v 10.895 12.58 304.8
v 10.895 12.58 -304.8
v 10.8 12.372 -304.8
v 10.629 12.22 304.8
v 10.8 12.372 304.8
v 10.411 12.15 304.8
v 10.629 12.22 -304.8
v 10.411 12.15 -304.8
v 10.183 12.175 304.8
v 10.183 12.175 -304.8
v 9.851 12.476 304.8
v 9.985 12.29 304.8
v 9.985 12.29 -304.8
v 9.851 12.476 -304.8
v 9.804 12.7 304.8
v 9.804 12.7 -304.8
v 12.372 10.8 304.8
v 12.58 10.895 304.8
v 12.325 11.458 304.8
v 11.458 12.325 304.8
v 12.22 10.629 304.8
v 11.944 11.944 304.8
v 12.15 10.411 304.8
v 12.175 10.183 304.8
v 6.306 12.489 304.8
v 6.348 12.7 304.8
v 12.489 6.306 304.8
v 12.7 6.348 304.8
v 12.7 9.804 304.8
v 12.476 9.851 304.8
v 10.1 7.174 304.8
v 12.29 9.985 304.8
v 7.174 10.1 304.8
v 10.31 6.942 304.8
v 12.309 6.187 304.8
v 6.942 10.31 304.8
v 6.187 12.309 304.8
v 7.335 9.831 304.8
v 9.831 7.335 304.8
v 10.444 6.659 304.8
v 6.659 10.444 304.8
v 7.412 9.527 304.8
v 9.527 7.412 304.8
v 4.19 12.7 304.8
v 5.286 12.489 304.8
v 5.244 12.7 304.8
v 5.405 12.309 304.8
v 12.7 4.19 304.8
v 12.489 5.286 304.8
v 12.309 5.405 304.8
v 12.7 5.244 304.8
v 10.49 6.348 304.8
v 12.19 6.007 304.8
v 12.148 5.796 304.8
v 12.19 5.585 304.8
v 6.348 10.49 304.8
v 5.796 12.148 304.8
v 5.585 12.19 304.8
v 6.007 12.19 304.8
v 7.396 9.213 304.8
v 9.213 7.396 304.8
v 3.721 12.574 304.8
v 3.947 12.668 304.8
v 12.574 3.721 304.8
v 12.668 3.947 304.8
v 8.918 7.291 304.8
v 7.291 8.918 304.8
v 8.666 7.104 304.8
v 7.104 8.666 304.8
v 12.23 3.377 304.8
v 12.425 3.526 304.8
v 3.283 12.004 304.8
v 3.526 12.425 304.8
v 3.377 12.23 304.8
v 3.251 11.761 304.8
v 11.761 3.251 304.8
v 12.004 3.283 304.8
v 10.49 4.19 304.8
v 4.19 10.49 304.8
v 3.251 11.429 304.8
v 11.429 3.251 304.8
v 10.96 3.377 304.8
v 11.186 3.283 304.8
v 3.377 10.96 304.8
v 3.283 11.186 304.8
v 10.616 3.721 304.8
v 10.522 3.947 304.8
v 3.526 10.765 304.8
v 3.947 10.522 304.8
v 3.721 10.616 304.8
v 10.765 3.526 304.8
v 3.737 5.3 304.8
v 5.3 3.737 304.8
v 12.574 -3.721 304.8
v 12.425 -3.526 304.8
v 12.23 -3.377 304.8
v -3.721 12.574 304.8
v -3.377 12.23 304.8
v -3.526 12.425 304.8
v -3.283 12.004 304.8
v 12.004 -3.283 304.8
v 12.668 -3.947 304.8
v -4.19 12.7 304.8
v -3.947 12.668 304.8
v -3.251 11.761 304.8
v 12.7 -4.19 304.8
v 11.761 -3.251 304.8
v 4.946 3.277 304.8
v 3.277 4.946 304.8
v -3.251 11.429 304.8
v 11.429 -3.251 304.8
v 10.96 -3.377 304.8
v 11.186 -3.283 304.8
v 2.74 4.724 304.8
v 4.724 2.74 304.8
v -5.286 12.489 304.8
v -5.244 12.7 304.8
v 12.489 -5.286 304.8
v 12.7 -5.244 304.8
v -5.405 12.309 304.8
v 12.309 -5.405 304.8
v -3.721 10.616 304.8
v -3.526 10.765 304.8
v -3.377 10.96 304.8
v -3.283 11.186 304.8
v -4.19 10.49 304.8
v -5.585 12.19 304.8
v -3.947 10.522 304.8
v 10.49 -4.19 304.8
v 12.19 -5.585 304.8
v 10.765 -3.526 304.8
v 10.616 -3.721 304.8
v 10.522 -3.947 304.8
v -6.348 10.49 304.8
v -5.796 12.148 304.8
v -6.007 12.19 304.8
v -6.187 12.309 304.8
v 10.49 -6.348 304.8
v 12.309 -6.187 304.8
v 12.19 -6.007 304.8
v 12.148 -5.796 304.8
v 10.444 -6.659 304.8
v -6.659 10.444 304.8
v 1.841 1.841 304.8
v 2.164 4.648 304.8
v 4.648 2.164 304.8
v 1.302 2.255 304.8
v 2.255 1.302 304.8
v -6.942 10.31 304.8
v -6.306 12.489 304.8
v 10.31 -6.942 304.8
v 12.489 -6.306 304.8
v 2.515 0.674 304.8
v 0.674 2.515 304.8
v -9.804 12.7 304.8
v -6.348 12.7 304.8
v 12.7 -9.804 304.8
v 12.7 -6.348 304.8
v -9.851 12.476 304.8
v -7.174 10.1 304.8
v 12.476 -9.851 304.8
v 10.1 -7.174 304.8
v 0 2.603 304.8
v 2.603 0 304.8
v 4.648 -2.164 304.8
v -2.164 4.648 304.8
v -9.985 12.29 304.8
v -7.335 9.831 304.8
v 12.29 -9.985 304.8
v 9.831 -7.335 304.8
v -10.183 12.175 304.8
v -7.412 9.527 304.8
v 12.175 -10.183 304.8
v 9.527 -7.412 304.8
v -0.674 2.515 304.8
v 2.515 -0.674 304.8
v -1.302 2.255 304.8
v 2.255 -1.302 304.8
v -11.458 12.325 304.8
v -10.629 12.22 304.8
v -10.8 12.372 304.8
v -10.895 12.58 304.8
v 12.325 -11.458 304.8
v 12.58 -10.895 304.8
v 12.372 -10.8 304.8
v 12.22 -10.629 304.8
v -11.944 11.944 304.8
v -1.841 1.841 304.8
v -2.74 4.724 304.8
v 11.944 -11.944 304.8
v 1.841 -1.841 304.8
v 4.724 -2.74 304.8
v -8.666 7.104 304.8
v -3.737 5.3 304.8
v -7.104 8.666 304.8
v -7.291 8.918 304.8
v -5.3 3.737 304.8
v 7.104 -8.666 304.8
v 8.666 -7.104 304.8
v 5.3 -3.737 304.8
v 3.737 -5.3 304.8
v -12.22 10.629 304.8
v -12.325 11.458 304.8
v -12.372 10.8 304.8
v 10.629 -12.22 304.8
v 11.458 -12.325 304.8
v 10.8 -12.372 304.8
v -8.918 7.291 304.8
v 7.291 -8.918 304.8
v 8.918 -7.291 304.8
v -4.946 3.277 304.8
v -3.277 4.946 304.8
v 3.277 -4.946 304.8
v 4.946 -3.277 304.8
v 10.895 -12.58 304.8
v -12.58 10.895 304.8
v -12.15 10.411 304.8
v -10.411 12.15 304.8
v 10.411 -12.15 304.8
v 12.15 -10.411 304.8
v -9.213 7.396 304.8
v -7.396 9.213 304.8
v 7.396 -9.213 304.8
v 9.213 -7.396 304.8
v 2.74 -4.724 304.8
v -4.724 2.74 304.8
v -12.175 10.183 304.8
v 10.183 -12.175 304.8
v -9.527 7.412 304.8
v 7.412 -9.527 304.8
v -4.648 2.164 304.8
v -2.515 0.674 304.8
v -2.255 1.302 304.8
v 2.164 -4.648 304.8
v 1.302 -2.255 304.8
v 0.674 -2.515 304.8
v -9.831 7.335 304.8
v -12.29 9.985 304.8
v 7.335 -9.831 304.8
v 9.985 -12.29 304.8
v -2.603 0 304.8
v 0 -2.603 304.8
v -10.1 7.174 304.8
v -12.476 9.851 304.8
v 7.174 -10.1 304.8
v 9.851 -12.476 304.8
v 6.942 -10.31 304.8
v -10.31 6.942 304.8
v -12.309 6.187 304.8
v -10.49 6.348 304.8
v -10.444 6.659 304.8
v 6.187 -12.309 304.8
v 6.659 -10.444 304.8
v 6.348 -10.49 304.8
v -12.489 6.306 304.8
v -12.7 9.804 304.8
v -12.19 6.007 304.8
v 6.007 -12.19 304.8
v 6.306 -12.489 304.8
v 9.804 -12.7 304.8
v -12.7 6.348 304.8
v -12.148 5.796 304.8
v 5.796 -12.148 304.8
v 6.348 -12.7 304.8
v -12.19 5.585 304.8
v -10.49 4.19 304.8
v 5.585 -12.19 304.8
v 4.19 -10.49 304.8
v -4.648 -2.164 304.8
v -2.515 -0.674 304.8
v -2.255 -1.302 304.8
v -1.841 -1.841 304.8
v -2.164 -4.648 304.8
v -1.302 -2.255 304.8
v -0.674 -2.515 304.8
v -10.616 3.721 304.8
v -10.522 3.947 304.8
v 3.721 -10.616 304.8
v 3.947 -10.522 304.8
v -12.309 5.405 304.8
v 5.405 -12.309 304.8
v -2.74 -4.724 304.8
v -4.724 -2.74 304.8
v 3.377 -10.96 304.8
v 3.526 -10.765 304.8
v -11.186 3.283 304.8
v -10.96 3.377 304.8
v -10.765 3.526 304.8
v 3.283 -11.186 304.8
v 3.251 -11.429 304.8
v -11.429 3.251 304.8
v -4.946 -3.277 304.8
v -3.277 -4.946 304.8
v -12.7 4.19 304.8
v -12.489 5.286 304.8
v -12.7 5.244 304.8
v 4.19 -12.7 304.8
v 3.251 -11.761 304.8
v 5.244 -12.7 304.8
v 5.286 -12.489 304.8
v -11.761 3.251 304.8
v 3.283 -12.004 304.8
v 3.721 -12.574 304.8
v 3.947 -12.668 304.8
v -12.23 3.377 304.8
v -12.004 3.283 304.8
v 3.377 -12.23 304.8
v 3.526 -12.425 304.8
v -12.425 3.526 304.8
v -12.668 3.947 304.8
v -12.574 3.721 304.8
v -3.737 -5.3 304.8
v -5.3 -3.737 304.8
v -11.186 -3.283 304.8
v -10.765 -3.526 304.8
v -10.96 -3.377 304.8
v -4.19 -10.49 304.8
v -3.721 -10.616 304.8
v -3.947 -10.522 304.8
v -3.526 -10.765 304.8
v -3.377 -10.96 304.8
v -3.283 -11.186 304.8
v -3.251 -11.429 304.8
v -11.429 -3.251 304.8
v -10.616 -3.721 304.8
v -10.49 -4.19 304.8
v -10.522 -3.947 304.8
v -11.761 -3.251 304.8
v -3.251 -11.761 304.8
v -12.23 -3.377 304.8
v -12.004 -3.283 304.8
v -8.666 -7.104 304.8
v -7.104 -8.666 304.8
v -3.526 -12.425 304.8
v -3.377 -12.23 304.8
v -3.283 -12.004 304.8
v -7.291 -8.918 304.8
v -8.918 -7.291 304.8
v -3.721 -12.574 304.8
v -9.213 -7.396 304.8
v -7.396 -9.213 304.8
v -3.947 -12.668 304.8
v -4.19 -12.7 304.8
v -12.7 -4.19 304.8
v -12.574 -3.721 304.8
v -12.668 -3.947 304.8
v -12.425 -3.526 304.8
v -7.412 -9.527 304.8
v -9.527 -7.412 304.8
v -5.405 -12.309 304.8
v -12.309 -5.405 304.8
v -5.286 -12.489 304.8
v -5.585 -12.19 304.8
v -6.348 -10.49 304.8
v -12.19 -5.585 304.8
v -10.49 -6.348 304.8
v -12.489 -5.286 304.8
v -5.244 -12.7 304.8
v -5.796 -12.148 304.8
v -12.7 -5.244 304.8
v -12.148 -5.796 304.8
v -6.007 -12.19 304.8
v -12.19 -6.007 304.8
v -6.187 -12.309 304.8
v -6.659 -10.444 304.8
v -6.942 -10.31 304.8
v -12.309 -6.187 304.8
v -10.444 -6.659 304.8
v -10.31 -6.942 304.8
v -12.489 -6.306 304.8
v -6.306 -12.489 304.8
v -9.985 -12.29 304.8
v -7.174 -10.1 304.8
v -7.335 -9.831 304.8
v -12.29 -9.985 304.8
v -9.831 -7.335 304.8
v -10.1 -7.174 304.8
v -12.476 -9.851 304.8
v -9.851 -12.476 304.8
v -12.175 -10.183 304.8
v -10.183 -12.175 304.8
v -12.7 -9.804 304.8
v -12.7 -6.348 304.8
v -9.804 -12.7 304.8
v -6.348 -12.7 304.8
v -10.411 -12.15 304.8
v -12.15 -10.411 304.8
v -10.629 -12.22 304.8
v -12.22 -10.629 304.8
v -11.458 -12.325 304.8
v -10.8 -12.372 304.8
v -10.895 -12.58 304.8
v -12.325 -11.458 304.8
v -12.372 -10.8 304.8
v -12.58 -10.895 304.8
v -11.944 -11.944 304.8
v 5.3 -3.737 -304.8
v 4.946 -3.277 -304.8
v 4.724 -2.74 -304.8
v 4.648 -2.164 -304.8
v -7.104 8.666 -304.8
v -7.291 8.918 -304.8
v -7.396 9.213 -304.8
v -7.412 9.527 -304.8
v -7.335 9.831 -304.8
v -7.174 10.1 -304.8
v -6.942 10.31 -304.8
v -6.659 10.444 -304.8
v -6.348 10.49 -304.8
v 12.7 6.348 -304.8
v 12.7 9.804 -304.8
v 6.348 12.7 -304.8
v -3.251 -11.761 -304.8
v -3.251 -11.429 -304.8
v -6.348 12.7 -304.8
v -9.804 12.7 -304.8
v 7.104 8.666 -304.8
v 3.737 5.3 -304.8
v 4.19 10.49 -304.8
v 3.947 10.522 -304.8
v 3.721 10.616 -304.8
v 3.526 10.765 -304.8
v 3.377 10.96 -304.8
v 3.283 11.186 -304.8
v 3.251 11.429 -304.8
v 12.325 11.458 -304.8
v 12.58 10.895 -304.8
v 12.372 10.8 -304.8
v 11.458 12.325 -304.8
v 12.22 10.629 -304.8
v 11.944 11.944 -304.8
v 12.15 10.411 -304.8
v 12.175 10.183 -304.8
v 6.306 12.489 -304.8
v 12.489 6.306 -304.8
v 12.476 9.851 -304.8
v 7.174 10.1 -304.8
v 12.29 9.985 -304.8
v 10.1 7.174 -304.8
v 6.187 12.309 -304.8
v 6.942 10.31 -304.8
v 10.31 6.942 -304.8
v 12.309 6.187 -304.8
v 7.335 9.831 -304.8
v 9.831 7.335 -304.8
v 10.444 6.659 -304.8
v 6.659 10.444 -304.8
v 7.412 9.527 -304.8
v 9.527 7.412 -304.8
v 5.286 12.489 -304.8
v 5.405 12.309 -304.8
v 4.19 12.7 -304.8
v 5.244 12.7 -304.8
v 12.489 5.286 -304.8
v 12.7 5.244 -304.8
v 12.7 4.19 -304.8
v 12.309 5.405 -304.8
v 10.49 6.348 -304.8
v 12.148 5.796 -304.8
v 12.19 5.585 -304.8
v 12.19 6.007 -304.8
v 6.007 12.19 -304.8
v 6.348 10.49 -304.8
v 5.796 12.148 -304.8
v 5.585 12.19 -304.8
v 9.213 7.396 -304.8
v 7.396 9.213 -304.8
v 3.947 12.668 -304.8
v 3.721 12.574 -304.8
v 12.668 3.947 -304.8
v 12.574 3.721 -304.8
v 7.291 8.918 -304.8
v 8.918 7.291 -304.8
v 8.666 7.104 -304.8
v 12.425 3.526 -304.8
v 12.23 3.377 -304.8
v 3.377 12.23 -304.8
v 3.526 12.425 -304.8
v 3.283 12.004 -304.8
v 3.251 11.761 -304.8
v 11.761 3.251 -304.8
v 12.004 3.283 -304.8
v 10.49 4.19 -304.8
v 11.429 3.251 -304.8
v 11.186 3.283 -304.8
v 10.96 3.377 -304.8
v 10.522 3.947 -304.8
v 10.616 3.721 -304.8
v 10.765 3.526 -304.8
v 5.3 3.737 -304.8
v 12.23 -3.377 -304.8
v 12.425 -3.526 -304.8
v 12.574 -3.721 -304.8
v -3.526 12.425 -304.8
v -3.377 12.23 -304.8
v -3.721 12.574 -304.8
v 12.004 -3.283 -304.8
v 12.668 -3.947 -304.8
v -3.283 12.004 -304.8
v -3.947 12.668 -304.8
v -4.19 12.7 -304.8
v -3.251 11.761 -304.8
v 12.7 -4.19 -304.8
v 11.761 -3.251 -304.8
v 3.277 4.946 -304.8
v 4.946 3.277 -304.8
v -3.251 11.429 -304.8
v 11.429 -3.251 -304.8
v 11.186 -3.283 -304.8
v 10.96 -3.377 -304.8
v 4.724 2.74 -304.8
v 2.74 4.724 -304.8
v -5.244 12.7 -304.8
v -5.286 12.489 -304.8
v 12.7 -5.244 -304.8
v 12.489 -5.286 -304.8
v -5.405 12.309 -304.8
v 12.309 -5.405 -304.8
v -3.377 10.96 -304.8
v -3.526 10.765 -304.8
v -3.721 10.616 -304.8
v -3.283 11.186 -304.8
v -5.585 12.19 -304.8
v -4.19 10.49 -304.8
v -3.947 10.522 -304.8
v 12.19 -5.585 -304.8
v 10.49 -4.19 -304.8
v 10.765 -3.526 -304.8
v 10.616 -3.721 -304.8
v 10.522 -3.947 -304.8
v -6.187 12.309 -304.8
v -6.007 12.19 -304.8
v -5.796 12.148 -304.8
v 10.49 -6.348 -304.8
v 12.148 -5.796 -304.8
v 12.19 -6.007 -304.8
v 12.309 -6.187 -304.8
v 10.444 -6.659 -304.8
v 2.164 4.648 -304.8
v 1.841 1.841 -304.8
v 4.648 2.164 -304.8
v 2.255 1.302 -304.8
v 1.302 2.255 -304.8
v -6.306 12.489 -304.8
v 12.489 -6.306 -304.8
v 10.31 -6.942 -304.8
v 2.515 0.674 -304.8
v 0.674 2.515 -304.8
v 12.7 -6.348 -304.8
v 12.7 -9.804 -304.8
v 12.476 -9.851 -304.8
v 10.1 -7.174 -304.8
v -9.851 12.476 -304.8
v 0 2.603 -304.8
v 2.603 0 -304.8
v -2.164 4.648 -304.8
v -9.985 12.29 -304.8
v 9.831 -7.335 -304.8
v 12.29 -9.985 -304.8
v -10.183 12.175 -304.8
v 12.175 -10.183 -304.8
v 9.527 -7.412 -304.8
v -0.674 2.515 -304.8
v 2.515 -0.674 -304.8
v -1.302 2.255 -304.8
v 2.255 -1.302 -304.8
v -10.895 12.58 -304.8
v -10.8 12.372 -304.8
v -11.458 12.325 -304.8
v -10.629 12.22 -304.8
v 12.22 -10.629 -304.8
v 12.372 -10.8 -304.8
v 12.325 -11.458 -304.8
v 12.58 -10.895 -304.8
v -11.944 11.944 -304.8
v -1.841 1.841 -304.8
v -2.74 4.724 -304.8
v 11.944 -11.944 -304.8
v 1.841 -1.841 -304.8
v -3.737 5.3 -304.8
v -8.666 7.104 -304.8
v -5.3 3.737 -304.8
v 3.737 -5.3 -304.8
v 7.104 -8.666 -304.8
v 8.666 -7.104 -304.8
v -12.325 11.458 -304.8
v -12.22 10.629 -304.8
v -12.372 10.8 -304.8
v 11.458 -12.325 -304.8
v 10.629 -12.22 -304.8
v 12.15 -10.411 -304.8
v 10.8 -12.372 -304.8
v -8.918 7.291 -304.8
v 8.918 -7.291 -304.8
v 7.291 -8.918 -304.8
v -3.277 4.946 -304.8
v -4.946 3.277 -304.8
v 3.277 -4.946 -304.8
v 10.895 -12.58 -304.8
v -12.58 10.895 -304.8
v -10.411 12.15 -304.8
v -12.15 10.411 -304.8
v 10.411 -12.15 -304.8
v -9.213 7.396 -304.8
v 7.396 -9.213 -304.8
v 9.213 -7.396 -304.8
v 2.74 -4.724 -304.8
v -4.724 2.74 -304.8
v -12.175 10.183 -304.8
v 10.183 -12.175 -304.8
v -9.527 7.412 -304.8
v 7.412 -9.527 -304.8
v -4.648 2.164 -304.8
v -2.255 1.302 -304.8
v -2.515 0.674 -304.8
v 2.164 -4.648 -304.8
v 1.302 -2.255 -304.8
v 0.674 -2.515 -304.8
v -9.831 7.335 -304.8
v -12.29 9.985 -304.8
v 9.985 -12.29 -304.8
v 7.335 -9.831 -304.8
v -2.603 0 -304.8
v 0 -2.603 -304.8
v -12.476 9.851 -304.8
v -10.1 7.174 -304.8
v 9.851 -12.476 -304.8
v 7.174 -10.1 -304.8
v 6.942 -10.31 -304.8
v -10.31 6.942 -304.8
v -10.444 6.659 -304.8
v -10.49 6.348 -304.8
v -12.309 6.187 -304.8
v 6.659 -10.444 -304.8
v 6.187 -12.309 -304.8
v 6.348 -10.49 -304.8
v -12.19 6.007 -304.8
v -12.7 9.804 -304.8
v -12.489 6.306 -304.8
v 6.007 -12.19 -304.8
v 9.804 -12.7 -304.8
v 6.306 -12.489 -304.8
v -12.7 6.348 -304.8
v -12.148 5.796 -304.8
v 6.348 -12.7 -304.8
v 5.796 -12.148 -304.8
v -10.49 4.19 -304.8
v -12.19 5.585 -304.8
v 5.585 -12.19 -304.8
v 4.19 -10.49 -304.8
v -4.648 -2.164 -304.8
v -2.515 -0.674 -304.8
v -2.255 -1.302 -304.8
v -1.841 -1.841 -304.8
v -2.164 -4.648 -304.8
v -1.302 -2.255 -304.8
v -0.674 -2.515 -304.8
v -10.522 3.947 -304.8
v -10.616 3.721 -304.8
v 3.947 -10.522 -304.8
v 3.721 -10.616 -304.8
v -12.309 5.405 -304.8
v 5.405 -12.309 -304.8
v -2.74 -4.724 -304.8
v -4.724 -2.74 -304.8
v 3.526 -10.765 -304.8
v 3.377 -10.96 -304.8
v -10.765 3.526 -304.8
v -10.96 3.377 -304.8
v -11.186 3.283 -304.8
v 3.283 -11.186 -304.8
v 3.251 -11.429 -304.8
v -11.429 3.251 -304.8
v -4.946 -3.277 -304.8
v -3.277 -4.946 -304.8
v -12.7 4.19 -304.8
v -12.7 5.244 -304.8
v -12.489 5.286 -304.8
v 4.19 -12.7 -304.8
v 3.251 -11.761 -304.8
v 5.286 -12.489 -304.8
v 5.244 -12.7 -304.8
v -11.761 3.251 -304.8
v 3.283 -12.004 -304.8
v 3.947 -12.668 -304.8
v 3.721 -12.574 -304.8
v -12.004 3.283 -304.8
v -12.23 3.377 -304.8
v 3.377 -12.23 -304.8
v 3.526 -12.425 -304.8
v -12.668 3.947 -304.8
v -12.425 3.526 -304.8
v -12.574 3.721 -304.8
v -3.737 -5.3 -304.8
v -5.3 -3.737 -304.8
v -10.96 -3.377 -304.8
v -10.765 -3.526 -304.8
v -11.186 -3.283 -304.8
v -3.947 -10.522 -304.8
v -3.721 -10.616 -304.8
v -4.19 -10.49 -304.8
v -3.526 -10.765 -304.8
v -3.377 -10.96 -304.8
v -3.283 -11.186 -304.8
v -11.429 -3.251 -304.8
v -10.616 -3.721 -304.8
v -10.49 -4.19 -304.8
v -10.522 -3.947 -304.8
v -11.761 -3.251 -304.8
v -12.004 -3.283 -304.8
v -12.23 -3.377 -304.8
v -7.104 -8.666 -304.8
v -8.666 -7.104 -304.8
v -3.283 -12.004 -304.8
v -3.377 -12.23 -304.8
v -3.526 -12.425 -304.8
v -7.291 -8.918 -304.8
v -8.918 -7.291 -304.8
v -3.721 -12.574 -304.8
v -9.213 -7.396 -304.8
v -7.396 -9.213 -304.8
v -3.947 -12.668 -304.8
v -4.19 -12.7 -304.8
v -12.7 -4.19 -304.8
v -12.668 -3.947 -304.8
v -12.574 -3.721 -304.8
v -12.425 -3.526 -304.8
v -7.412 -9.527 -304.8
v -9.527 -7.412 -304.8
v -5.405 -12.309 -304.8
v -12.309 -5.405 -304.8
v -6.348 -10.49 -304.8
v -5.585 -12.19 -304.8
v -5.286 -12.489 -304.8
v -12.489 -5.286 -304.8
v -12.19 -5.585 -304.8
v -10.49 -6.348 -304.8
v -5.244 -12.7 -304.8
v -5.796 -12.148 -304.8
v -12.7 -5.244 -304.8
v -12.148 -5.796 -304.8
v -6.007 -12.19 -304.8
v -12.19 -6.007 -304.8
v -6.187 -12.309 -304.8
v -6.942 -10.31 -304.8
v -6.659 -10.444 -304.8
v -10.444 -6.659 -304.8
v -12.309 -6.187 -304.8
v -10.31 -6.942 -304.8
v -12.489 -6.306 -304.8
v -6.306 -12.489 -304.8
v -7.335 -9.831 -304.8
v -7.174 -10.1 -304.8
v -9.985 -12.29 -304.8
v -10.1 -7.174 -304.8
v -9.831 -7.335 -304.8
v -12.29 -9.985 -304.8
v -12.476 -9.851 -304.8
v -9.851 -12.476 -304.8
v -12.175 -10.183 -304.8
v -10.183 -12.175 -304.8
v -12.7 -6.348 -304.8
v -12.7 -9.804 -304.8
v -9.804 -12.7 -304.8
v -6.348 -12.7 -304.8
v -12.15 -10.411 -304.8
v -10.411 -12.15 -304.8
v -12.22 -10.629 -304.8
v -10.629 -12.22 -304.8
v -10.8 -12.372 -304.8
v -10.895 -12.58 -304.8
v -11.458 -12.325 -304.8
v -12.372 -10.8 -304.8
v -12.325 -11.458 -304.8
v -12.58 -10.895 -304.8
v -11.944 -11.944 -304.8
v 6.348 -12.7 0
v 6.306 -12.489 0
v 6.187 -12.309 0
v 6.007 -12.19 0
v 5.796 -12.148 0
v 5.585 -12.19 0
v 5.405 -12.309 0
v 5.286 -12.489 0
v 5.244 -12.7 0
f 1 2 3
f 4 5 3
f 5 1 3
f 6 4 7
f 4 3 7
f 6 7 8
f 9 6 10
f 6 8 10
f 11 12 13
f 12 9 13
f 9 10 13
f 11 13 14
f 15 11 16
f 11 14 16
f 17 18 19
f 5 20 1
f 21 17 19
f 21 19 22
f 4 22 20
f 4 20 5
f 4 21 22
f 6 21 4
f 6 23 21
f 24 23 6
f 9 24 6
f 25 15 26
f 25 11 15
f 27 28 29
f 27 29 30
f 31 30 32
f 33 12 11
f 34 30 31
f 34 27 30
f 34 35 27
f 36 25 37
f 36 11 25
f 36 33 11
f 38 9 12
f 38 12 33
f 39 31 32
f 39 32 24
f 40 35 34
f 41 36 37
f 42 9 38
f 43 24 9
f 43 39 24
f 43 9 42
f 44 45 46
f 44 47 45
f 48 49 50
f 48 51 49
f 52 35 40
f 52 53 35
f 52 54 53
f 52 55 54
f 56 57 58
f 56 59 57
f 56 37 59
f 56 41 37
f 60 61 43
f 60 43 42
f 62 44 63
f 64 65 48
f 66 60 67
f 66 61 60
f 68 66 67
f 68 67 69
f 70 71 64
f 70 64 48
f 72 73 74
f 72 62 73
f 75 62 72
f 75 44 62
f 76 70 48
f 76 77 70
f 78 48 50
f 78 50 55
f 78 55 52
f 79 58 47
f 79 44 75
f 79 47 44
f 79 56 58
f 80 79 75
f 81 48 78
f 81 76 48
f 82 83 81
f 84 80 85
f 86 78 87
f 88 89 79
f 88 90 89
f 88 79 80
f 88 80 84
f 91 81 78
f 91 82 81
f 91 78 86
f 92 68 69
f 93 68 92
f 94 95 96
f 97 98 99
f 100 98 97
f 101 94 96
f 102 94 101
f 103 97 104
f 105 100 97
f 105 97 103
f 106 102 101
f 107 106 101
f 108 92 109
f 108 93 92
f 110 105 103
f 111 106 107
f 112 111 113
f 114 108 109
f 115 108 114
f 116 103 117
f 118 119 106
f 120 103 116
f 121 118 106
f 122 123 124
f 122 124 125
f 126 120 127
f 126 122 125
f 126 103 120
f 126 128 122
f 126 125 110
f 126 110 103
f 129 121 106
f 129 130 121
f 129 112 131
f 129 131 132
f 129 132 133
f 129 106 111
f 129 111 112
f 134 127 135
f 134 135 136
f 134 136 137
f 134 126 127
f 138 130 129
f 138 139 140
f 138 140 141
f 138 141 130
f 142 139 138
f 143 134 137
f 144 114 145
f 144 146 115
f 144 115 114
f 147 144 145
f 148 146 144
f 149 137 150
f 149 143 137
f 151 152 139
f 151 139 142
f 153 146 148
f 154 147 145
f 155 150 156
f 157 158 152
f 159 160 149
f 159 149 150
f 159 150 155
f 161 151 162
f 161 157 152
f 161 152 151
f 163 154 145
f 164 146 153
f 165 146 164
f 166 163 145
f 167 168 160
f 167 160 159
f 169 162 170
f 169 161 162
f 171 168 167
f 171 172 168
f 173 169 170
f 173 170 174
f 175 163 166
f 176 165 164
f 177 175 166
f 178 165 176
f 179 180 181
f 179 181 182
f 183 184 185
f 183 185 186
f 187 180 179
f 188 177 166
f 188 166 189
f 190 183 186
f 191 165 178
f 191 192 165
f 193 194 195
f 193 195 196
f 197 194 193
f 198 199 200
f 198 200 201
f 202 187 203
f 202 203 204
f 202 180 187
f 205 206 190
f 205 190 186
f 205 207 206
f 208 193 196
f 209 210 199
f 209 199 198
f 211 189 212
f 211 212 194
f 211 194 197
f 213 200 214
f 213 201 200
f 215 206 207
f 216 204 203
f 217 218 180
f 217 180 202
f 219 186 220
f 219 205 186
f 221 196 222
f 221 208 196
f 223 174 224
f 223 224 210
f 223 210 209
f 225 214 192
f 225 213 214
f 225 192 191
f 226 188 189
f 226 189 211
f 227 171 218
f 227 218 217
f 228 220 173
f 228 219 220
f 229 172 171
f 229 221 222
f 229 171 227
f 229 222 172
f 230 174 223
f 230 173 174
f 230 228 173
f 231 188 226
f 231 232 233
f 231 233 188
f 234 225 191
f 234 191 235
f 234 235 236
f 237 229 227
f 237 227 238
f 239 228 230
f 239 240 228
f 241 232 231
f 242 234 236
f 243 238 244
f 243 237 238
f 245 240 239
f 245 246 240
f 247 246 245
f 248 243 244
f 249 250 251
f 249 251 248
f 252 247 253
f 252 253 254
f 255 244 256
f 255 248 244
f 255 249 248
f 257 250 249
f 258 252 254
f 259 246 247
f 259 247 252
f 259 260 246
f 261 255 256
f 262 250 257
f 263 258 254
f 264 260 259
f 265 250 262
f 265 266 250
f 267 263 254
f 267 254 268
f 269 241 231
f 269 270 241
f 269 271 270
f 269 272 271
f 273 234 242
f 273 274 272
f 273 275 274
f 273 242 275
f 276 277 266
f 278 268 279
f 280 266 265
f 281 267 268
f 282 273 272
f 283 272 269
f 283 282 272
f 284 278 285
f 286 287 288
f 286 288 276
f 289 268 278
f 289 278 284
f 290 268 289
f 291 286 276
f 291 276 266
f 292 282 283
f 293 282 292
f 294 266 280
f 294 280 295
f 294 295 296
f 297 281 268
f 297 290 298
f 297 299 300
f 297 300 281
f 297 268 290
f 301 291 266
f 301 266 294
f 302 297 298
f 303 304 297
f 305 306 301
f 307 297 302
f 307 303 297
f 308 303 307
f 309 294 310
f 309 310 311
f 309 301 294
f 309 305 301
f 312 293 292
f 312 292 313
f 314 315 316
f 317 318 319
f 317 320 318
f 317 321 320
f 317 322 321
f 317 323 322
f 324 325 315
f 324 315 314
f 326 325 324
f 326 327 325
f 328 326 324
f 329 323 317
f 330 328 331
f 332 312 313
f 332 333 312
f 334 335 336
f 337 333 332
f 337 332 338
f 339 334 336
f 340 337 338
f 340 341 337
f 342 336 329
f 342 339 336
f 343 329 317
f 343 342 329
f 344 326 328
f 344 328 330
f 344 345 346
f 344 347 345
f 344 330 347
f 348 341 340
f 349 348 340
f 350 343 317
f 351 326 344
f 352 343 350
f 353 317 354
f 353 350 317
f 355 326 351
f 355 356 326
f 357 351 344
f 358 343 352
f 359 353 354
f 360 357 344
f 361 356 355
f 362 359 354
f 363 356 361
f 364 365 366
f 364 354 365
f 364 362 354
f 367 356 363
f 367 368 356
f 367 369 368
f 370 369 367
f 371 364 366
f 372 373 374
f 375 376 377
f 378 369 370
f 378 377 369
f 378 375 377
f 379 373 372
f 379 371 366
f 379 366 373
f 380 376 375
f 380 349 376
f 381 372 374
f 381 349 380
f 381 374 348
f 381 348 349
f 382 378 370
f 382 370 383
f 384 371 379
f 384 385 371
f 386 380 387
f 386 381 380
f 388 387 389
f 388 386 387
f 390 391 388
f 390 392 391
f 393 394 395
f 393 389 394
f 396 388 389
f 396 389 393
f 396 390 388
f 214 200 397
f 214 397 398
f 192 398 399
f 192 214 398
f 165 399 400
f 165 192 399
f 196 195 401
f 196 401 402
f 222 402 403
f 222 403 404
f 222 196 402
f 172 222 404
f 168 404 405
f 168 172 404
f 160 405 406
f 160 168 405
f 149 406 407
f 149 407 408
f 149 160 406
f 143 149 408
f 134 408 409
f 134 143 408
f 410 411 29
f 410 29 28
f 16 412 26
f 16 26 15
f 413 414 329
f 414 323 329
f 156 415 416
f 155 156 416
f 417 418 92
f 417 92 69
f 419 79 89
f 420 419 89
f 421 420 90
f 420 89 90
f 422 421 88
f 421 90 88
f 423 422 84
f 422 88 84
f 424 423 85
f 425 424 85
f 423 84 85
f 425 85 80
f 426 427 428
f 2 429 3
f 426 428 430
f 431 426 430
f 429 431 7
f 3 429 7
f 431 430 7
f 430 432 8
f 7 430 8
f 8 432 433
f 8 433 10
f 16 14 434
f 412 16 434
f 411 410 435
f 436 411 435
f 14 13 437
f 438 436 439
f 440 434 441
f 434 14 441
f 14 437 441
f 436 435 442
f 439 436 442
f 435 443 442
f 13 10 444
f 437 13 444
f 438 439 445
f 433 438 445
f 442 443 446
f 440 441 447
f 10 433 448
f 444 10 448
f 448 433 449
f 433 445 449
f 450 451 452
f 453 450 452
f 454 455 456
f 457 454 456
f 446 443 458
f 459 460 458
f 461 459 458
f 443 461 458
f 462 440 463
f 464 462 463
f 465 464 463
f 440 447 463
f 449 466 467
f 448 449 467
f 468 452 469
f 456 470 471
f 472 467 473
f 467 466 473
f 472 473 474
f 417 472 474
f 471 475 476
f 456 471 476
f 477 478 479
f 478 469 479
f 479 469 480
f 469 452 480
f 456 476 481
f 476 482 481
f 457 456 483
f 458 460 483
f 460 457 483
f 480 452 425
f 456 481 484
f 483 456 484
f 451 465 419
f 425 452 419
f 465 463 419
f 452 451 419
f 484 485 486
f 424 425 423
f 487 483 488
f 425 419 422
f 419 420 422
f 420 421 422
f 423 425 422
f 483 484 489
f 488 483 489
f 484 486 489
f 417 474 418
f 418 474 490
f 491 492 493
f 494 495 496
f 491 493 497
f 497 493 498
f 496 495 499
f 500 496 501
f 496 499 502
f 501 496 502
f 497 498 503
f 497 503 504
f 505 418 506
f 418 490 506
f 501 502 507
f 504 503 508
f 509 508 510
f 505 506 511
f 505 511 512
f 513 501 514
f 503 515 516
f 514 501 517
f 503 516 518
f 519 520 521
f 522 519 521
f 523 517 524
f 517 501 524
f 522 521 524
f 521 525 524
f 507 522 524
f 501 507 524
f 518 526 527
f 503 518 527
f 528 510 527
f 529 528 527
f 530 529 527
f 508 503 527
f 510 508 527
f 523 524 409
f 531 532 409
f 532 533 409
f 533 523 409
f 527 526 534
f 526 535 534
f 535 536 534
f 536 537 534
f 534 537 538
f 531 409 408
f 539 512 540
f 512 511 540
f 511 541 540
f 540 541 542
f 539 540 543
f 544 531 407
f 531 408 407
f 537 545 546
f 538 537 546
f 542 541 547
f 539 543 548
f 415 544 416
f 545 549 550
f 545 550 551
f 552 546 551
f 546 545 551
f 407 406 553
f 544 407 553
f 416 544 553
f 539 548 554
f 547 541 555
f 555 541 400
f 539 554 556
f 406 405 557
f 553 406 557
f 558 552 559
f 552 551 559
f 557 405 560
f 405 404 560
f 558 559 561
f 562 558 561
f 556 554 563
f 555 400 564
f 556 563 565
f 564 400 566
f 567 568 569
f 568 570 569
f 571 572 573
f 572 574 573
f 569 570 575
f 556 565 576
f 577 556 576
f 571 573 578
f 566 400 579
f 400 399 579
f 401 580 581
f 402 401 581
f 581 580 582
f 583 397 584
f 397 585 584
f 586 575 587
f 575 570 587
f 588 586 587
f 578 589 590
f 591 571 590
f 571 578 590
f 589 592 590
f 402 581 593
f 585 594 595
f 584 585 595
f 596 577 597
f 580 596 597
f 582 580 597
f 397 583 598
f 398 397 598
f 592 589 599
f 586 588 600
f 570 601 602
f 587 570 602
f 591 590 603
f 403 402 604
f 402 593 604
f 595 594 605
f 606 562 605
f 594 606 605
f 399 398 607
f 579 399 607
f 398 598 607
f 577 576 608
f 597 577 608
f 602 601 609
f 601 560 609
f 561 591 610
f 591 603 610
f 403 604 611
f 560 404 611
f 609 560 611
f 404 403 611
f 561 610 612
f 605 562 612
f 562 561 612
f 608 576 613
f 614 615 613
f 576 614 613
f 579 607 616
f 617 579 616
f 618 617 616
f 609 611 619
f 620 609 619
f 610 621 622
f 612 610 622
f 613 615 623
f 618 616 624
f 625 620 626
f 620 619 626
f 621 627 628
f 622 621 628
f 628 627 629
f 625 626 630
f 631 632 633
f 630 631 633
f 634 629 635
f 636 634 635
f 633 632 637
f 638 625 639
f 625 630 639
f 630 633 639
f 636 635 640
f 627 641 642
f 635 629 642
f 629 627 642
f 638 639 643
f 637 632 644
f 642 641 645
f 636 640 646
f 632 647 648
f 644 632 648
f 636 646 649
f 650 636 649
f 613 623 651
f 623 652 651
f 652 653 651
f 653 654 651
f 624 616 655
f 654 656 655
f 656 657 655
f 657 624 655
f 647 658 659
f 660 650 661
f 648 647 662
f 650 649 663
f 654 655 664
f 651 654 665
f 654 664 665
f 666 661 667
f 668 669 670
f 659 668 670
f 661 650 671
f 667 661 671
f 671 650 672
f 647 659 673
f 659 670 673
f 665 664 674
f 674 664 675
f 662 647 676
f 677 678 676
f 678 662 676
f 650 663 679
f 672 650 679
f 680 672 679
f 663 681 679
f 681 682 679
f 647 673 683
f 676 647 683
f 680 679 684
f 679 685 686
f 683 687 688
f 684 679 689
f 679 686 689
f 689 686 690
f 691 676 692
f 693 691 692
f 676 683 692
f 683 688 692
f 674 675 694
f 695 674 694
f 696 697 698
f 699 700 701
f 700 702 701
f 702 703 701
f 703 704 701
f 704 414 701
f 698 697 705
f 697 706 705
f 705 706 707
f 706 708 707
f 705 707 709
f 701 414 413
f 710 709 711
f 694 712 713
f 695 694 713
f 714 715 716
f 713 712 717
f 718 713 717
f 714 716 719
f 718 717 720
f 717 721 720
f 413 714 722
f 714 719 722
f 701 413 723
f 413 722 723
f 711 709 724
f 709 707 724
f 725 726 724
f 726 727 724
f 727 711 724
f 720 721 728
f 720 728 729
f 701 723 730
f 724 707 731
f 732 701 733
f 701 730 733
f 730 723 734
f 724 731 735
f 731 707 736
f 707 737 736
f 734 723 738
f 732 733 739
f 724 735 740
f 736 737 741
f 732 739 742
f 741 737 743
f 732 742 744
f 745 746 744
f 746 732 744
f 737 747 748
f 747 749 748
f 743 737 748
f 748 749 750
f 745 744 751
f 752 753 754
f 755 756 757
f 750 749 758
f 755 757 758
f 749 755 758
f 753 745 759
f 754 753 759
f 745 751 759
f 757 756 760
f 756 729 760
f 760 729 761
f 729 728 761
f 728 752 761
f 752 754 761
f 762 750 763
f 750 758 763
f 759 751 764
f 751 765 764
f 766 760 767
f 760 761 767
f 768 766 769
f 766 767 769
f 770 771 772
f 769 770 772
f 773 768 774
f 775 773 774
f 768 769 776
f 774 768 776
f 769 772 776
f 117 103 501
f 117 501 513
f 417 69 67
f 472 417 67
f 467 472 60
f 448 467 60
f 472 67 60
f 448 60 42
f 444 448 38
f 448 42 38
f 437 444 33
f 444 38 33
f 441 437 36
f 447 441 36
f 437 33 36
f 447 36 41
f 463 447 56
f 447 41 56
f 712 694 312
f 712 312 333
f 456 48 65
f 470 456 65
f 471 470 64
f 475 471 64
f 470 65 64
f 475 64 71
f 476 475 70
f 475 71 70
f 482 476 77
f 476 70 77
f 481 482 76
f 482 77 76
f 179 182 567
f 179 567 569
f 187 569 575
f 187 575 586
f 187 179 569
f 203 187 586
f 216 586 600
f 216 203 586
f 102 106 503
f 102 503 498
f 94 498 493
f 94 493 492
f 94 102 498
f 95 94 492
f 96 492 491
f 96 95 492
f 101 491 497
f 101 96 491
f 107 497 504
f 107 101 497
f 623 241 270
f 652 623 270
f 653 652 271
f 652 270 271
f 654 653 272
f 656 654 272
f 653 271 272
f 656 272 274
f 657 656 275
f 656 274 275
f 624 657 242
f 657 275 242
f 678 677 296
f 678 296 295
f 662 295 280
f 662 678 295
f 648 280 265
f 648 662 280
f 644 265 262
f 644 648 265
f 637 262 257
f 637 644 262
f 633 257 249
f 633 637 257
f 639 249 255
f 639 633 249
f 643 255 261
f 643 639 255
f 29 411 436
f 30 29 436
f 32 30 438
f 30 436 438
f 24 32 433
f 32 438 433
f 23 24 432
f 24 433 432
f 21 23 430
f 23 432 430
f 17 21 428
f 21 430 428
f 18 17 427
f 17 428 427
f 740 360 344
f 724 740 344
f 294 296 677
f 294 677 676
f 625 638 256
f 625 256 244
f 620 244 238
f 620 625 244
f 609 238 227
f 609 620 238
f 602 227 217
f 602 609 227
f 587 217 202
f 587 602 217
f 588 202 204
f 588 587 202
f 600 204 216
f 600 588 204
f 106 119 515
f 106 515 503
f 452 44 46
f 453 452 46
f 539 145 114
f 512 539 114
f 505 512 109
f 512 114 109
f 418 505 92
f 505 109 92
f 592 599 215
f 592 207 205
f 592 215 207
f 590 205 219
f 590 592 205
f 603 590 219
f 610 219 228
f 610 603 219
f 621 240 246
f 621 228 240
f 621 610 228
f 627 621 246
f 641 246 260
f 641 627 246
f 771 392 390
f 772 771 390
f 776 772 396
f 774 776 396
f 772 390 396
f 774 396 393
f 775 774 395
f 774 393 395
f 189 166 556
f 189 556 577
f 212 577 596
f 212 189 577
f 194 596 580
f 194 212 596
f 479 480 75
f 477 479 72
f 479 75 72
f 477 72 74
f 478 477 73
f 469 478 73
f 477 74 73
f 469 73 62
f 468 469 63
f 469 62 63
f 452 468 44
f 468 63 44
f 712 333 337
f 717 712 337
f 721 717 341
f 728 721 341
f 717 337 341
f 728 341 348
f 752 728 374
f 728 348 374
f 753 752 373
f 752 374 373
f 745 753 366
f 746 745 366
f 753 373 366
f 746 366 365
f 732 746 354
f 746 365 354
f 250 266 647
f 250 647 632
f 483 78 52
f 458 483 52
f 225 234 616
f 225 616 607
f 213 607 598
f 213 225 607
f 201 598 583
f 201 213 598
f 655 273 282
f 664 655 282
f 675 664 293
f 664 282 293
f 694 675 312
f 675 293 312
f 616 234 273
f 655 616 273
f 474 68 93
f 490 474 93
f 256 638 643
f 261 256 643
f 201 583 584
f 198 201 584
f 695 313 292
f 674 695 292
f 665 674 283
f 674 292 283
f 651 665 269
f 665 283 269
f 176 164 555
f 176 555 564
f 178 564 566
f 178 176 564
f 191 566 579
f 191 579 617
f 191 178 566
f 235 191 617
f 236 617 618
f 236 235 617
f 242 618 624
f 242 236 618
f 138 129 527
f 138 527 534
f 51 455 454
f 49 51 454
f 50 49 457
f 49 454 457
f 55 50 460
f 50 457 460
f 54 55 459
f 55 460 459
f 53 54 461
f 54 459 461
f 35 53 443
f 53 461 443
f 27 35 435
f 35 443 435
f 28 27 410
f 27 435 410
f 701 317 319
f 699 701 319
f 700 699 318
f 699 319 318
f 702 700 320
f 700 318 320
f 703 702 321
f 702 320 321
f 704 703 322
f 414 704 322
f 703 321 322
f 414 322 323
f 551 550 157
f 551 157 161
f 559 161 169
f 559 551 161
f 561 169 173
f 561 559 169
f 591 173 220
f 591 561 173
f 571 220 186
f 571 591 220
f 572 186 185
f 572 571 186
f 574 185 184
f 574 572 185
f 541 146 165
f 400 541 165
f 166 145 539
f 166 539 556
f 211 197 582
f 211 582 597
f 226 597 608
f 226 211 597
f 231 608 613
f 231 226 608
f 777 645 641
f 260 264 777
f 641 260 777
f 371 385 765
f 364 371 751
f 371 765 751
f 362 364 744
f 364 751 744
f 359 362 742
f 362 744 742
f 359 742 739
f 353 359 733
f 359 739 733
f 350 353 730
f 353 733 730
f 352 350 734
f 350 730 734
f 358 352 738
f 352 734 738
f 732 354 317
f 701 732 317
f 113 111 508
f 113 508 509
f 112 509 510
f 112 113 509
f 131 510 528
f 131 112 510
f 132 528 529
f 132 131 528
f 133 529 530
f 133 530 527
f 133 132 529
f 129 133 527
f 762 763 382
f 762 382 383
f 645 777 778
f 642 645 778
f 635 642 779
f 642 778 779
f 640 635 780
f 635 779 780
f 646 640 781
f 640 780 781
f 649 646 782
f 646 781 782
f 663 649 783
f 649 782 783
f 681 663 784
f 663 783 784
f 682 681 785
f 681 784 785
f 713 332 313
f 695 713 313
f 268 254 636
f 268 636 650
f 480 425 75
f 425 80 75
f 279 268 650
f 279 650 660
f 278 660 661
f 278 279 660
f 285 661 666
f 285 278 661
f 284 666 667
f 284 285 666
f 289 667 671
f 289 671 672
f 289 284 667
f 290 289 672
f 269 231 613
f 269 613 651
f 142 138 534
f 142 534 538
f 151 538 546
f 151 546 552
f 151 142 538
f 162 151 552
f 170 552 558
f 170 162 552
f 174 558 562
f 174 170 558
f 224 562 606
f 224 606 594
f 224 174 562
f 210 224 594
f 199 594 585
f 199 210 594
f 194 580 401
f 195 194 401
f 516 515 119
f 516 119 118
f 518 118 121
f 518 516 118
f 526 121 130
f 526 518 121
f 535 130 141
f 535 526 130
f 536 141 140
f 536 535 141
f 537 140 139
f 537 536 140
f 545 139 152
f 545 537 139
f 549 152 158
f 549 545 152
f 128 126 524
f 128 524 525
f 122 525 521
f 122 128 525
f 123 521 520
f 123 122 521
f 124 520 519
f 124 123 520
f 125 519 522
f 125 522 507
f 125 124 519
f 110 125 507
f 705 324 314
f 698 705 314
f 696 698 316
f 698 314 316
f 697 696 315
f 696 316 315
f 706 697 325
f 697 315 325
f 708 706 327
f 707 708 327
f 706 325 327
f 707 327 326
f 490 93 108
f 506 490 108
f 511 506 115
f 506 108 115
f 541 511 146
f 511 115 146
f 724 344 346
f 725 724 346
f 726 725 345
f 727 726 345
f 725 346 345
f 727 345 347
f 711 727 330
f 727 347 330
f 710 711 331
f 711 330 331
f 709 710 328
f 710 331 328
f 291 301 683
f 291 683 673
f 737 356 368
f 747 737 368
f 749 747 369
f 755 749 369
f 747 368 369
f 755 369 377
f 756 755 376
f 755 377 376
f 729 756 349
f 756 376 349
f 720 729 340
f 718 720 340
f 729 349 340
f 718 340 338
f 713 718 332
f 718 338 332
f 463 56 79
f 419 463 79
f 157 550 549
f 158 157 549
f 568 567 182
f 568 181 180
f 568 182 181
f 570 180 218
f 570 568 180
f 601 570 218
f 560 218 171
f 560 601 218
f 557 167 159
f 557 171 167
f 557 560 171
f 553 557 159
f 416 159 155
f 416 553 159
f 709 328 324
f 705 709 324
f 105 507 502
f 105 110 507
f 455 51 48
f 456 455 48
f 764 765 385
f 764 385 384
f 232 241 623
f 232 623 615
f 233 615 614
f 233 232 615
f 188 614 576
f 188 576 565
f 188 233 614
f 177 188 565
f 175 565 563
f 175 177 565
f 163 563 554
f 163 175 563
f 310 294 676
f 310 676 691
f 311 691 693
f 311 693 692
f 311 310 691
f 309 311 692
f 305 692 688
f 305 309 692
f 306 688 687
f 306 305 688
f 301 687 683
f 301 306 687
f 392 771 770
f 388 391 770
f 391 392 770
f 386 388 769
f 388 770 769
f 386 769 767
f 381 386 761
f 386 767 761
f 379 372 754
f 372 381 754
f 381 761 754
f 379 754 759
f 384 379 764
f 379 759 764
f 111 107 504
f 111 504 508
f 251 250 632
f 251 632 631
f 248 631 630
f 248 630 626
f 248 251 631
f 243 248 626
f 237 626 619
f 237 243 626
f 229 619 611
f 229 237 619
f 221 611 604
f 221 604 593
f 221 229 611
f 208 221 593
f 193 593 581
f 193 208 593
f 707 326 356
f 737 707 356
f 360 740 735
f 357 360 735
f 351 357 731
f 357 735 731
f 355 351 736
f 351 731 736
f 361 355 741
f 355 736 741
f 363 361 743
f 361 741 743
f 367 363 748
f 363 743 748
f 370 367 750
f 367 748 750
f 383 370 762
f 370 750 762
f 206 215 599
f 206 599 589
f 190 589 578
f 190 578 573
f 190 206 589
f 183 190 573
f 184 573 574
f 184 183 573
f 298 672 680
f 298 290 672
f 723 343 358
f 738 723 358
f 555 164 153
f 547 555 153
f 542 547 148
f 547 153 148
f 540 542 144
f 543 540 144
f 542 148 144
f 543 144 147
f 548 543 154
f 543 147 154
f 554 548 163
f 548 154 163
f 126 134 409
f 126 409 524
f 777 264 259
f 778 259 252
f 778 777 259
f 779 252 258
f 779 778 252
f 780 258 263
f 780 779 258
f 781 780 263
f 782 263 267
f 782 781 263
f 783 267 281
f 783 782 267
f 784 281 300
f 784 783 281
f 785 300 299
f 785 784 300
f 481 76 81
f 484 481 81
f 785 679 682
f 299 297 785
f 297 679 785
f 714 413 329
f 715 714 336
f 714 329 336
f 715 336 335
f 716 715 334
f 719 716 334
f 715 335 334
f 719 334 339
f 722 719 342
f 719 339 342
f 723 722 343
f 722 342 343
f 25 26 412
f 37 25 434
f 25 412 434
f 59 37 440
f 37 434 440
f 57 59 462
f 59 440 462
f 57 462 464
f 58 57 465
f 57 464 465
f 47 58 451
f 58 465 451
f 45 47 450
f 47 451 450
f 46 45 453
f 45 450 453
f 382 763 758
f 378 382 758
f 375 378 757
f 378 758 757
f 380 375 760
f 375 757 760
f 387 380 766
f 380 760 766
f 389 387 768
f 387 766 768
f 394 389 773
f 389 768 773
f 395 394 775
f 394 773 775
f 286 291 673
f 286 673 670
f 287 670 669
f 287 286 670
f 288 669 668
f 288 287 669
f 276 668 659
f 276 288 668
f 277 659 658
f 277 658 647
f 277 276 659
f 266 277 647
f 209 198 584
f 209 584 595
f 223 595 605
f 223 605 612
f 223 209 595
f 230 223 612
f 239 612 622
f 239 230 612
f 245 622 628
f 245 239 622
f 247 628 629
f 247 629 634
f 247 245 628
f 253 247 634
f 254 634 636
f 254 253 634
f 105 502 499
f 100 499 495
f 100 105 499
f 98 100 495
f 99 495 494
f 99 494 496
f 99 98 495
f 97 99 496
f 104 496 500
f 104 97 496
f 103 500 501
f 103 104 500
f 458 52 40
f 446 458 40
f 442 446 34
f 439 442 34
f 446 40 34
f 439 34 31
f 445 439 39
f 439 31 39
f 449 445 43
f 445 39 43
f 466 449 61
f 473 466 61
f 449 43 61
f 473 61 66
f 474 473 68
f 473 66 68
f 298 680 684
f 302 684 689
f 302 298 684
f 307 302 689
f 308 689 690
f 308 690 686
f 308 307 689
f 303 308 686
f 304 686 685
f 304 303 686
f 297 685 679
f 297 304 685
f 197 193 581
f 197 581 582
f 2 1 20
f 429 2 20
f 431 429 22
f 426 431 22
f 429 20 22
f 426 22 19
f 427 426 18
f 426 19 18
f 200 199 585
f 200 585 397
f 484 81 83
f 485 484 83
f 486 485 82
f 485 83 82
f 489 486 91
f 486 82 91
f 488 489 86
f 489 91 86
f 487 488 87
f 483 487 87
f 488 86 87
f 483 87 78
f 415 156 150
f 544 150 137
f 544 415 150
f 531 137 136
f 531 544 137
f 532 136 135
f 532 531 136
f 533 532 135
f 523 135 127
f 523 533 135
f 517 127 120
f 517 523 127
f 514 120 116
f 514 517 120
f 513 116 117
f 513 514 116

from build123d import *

# Parameters (mm, degrees)
BOSS_EXTRUDE1_DEPTH     = 304.8
SKETCH5_R               = 0.55245
CUT_EXTRUDE1_DEPTH      = 305.8
CUT_EXTRUDE1_DEPTH_BACK = 305.8


with BuildPart() as part:
    # Sketch4 → Boss-Extrude1 (new body, symmetric)
    with BuildSketch(Plane.XY):
        with BuildLine():
            Line((4.190365, -12.7), (10.11729625, -12.7))
            ThreePointArc((10.11729625, -12.7), (11.943543585, -11.943543585), (12.7, -10.11729625))
            Line((12.7, -10.11729625), (12.7, -4.190365))
            ThreePointArc((12.7, -4.190365), (12.42492494, -3.52627506), (11.760835, -3.2512))
            Line((11.760835, -3.2512), (11.429365, -3.2512))
            ThreePointArc((11.429365, -3.2512), (10.76527506, -3.52627506), (10.4902, -4.190365))
            Line((10.4902, -4.190365), (10.4902, -6.348478019))
            ThreePointArc((10.4902, -6.348478019), (9.830707141, -7.335478831), (8.666460301, -7.103895736))
            Line((8.666460301, -7.103895736), (5.299899128, -3.737334563))
            ThreePointArc((5.299899128, -3.737334563), (4.817571085, -3.015479634), (4.6482, -2.16399369))
            Line((4.6482, -2.16399369), (4.6482, 0))
            Line((4.6482, 0), (2.6035, 0))
            ThreePointArc((2.6035, 0), (1.840952505, -1.840952505), (0, -2.6035))
            Line((0, -2.6035), (0, -4.6482))
            Line((0, -4.6482), (2.16399369, -4.6482))
            ThreePointArc((2.16399369, -4.6482), (3.015479634, -4.817571085), (3.737334563, -5.299899128))
            Line((3.737334563, -5.299899128), (7.103895736, -8.666460301))
            ThreePointArc((7.103895736, -8.666460301), (7.335478831, -9.830707141), (6.348478019, -10.4902))
            Line((6.348478019, -10.4902), (4.190365, -10.4902))
            ThreePointArc((4.190365, -10.4902), (3.52627506, -10.76527506), (3.2512, -11.429365))
            Line((3.2512, -11.429365), (3.2512, -11.760835))
            ThreePointArc((3.2512, -11.760835), (3.52627506, -12.42492494), (4.190365, -12.7))
        make_face()
    extrude(amount=BOSS_EXTRUDE1_DEPTH, both=True)

    # Sketch5 → Cut-Extrude1 (cut, two sides)
    with BuildSketch(Plane.XY) as cut_extrude1_sk:
        with Locations((10.356153152, -12.7)):
            Circle(SKETCH5_R)
        with Locations((5.796028019, -12.7)):
            Circle(SKETCH5_R)
        with Locations((12.7, -10.356153152)):
            Circle(SKETCH5_R)
        with Locations((12.7, -5.796028019)):
            Circle(SKETCH5_R)
    extrude(amount=CUT_EXTRUDE1_DEPTH, mode=Mode.SUBTRACT)
    extrude(cut_extrude1_sk.sketch, amount=-CUT_EXTRUDE1_DEPTH_BACK, mode=Mode.SUBTRACT)

    # Mirror1: part across plane


with BuildPart() as part_1:
    add(part.part)
    add(part.part.mirror(Plane(origin=(0, 0, 0), x_dir=(0, 0, 1), z_dir=(1, 0, 0))))

    # Mirror2: part across plane


with BuildPart() as part_2:
    add(part_1.part)
    add(part_1.part.mirror(Plane.ZX))


solid = part_2.part
